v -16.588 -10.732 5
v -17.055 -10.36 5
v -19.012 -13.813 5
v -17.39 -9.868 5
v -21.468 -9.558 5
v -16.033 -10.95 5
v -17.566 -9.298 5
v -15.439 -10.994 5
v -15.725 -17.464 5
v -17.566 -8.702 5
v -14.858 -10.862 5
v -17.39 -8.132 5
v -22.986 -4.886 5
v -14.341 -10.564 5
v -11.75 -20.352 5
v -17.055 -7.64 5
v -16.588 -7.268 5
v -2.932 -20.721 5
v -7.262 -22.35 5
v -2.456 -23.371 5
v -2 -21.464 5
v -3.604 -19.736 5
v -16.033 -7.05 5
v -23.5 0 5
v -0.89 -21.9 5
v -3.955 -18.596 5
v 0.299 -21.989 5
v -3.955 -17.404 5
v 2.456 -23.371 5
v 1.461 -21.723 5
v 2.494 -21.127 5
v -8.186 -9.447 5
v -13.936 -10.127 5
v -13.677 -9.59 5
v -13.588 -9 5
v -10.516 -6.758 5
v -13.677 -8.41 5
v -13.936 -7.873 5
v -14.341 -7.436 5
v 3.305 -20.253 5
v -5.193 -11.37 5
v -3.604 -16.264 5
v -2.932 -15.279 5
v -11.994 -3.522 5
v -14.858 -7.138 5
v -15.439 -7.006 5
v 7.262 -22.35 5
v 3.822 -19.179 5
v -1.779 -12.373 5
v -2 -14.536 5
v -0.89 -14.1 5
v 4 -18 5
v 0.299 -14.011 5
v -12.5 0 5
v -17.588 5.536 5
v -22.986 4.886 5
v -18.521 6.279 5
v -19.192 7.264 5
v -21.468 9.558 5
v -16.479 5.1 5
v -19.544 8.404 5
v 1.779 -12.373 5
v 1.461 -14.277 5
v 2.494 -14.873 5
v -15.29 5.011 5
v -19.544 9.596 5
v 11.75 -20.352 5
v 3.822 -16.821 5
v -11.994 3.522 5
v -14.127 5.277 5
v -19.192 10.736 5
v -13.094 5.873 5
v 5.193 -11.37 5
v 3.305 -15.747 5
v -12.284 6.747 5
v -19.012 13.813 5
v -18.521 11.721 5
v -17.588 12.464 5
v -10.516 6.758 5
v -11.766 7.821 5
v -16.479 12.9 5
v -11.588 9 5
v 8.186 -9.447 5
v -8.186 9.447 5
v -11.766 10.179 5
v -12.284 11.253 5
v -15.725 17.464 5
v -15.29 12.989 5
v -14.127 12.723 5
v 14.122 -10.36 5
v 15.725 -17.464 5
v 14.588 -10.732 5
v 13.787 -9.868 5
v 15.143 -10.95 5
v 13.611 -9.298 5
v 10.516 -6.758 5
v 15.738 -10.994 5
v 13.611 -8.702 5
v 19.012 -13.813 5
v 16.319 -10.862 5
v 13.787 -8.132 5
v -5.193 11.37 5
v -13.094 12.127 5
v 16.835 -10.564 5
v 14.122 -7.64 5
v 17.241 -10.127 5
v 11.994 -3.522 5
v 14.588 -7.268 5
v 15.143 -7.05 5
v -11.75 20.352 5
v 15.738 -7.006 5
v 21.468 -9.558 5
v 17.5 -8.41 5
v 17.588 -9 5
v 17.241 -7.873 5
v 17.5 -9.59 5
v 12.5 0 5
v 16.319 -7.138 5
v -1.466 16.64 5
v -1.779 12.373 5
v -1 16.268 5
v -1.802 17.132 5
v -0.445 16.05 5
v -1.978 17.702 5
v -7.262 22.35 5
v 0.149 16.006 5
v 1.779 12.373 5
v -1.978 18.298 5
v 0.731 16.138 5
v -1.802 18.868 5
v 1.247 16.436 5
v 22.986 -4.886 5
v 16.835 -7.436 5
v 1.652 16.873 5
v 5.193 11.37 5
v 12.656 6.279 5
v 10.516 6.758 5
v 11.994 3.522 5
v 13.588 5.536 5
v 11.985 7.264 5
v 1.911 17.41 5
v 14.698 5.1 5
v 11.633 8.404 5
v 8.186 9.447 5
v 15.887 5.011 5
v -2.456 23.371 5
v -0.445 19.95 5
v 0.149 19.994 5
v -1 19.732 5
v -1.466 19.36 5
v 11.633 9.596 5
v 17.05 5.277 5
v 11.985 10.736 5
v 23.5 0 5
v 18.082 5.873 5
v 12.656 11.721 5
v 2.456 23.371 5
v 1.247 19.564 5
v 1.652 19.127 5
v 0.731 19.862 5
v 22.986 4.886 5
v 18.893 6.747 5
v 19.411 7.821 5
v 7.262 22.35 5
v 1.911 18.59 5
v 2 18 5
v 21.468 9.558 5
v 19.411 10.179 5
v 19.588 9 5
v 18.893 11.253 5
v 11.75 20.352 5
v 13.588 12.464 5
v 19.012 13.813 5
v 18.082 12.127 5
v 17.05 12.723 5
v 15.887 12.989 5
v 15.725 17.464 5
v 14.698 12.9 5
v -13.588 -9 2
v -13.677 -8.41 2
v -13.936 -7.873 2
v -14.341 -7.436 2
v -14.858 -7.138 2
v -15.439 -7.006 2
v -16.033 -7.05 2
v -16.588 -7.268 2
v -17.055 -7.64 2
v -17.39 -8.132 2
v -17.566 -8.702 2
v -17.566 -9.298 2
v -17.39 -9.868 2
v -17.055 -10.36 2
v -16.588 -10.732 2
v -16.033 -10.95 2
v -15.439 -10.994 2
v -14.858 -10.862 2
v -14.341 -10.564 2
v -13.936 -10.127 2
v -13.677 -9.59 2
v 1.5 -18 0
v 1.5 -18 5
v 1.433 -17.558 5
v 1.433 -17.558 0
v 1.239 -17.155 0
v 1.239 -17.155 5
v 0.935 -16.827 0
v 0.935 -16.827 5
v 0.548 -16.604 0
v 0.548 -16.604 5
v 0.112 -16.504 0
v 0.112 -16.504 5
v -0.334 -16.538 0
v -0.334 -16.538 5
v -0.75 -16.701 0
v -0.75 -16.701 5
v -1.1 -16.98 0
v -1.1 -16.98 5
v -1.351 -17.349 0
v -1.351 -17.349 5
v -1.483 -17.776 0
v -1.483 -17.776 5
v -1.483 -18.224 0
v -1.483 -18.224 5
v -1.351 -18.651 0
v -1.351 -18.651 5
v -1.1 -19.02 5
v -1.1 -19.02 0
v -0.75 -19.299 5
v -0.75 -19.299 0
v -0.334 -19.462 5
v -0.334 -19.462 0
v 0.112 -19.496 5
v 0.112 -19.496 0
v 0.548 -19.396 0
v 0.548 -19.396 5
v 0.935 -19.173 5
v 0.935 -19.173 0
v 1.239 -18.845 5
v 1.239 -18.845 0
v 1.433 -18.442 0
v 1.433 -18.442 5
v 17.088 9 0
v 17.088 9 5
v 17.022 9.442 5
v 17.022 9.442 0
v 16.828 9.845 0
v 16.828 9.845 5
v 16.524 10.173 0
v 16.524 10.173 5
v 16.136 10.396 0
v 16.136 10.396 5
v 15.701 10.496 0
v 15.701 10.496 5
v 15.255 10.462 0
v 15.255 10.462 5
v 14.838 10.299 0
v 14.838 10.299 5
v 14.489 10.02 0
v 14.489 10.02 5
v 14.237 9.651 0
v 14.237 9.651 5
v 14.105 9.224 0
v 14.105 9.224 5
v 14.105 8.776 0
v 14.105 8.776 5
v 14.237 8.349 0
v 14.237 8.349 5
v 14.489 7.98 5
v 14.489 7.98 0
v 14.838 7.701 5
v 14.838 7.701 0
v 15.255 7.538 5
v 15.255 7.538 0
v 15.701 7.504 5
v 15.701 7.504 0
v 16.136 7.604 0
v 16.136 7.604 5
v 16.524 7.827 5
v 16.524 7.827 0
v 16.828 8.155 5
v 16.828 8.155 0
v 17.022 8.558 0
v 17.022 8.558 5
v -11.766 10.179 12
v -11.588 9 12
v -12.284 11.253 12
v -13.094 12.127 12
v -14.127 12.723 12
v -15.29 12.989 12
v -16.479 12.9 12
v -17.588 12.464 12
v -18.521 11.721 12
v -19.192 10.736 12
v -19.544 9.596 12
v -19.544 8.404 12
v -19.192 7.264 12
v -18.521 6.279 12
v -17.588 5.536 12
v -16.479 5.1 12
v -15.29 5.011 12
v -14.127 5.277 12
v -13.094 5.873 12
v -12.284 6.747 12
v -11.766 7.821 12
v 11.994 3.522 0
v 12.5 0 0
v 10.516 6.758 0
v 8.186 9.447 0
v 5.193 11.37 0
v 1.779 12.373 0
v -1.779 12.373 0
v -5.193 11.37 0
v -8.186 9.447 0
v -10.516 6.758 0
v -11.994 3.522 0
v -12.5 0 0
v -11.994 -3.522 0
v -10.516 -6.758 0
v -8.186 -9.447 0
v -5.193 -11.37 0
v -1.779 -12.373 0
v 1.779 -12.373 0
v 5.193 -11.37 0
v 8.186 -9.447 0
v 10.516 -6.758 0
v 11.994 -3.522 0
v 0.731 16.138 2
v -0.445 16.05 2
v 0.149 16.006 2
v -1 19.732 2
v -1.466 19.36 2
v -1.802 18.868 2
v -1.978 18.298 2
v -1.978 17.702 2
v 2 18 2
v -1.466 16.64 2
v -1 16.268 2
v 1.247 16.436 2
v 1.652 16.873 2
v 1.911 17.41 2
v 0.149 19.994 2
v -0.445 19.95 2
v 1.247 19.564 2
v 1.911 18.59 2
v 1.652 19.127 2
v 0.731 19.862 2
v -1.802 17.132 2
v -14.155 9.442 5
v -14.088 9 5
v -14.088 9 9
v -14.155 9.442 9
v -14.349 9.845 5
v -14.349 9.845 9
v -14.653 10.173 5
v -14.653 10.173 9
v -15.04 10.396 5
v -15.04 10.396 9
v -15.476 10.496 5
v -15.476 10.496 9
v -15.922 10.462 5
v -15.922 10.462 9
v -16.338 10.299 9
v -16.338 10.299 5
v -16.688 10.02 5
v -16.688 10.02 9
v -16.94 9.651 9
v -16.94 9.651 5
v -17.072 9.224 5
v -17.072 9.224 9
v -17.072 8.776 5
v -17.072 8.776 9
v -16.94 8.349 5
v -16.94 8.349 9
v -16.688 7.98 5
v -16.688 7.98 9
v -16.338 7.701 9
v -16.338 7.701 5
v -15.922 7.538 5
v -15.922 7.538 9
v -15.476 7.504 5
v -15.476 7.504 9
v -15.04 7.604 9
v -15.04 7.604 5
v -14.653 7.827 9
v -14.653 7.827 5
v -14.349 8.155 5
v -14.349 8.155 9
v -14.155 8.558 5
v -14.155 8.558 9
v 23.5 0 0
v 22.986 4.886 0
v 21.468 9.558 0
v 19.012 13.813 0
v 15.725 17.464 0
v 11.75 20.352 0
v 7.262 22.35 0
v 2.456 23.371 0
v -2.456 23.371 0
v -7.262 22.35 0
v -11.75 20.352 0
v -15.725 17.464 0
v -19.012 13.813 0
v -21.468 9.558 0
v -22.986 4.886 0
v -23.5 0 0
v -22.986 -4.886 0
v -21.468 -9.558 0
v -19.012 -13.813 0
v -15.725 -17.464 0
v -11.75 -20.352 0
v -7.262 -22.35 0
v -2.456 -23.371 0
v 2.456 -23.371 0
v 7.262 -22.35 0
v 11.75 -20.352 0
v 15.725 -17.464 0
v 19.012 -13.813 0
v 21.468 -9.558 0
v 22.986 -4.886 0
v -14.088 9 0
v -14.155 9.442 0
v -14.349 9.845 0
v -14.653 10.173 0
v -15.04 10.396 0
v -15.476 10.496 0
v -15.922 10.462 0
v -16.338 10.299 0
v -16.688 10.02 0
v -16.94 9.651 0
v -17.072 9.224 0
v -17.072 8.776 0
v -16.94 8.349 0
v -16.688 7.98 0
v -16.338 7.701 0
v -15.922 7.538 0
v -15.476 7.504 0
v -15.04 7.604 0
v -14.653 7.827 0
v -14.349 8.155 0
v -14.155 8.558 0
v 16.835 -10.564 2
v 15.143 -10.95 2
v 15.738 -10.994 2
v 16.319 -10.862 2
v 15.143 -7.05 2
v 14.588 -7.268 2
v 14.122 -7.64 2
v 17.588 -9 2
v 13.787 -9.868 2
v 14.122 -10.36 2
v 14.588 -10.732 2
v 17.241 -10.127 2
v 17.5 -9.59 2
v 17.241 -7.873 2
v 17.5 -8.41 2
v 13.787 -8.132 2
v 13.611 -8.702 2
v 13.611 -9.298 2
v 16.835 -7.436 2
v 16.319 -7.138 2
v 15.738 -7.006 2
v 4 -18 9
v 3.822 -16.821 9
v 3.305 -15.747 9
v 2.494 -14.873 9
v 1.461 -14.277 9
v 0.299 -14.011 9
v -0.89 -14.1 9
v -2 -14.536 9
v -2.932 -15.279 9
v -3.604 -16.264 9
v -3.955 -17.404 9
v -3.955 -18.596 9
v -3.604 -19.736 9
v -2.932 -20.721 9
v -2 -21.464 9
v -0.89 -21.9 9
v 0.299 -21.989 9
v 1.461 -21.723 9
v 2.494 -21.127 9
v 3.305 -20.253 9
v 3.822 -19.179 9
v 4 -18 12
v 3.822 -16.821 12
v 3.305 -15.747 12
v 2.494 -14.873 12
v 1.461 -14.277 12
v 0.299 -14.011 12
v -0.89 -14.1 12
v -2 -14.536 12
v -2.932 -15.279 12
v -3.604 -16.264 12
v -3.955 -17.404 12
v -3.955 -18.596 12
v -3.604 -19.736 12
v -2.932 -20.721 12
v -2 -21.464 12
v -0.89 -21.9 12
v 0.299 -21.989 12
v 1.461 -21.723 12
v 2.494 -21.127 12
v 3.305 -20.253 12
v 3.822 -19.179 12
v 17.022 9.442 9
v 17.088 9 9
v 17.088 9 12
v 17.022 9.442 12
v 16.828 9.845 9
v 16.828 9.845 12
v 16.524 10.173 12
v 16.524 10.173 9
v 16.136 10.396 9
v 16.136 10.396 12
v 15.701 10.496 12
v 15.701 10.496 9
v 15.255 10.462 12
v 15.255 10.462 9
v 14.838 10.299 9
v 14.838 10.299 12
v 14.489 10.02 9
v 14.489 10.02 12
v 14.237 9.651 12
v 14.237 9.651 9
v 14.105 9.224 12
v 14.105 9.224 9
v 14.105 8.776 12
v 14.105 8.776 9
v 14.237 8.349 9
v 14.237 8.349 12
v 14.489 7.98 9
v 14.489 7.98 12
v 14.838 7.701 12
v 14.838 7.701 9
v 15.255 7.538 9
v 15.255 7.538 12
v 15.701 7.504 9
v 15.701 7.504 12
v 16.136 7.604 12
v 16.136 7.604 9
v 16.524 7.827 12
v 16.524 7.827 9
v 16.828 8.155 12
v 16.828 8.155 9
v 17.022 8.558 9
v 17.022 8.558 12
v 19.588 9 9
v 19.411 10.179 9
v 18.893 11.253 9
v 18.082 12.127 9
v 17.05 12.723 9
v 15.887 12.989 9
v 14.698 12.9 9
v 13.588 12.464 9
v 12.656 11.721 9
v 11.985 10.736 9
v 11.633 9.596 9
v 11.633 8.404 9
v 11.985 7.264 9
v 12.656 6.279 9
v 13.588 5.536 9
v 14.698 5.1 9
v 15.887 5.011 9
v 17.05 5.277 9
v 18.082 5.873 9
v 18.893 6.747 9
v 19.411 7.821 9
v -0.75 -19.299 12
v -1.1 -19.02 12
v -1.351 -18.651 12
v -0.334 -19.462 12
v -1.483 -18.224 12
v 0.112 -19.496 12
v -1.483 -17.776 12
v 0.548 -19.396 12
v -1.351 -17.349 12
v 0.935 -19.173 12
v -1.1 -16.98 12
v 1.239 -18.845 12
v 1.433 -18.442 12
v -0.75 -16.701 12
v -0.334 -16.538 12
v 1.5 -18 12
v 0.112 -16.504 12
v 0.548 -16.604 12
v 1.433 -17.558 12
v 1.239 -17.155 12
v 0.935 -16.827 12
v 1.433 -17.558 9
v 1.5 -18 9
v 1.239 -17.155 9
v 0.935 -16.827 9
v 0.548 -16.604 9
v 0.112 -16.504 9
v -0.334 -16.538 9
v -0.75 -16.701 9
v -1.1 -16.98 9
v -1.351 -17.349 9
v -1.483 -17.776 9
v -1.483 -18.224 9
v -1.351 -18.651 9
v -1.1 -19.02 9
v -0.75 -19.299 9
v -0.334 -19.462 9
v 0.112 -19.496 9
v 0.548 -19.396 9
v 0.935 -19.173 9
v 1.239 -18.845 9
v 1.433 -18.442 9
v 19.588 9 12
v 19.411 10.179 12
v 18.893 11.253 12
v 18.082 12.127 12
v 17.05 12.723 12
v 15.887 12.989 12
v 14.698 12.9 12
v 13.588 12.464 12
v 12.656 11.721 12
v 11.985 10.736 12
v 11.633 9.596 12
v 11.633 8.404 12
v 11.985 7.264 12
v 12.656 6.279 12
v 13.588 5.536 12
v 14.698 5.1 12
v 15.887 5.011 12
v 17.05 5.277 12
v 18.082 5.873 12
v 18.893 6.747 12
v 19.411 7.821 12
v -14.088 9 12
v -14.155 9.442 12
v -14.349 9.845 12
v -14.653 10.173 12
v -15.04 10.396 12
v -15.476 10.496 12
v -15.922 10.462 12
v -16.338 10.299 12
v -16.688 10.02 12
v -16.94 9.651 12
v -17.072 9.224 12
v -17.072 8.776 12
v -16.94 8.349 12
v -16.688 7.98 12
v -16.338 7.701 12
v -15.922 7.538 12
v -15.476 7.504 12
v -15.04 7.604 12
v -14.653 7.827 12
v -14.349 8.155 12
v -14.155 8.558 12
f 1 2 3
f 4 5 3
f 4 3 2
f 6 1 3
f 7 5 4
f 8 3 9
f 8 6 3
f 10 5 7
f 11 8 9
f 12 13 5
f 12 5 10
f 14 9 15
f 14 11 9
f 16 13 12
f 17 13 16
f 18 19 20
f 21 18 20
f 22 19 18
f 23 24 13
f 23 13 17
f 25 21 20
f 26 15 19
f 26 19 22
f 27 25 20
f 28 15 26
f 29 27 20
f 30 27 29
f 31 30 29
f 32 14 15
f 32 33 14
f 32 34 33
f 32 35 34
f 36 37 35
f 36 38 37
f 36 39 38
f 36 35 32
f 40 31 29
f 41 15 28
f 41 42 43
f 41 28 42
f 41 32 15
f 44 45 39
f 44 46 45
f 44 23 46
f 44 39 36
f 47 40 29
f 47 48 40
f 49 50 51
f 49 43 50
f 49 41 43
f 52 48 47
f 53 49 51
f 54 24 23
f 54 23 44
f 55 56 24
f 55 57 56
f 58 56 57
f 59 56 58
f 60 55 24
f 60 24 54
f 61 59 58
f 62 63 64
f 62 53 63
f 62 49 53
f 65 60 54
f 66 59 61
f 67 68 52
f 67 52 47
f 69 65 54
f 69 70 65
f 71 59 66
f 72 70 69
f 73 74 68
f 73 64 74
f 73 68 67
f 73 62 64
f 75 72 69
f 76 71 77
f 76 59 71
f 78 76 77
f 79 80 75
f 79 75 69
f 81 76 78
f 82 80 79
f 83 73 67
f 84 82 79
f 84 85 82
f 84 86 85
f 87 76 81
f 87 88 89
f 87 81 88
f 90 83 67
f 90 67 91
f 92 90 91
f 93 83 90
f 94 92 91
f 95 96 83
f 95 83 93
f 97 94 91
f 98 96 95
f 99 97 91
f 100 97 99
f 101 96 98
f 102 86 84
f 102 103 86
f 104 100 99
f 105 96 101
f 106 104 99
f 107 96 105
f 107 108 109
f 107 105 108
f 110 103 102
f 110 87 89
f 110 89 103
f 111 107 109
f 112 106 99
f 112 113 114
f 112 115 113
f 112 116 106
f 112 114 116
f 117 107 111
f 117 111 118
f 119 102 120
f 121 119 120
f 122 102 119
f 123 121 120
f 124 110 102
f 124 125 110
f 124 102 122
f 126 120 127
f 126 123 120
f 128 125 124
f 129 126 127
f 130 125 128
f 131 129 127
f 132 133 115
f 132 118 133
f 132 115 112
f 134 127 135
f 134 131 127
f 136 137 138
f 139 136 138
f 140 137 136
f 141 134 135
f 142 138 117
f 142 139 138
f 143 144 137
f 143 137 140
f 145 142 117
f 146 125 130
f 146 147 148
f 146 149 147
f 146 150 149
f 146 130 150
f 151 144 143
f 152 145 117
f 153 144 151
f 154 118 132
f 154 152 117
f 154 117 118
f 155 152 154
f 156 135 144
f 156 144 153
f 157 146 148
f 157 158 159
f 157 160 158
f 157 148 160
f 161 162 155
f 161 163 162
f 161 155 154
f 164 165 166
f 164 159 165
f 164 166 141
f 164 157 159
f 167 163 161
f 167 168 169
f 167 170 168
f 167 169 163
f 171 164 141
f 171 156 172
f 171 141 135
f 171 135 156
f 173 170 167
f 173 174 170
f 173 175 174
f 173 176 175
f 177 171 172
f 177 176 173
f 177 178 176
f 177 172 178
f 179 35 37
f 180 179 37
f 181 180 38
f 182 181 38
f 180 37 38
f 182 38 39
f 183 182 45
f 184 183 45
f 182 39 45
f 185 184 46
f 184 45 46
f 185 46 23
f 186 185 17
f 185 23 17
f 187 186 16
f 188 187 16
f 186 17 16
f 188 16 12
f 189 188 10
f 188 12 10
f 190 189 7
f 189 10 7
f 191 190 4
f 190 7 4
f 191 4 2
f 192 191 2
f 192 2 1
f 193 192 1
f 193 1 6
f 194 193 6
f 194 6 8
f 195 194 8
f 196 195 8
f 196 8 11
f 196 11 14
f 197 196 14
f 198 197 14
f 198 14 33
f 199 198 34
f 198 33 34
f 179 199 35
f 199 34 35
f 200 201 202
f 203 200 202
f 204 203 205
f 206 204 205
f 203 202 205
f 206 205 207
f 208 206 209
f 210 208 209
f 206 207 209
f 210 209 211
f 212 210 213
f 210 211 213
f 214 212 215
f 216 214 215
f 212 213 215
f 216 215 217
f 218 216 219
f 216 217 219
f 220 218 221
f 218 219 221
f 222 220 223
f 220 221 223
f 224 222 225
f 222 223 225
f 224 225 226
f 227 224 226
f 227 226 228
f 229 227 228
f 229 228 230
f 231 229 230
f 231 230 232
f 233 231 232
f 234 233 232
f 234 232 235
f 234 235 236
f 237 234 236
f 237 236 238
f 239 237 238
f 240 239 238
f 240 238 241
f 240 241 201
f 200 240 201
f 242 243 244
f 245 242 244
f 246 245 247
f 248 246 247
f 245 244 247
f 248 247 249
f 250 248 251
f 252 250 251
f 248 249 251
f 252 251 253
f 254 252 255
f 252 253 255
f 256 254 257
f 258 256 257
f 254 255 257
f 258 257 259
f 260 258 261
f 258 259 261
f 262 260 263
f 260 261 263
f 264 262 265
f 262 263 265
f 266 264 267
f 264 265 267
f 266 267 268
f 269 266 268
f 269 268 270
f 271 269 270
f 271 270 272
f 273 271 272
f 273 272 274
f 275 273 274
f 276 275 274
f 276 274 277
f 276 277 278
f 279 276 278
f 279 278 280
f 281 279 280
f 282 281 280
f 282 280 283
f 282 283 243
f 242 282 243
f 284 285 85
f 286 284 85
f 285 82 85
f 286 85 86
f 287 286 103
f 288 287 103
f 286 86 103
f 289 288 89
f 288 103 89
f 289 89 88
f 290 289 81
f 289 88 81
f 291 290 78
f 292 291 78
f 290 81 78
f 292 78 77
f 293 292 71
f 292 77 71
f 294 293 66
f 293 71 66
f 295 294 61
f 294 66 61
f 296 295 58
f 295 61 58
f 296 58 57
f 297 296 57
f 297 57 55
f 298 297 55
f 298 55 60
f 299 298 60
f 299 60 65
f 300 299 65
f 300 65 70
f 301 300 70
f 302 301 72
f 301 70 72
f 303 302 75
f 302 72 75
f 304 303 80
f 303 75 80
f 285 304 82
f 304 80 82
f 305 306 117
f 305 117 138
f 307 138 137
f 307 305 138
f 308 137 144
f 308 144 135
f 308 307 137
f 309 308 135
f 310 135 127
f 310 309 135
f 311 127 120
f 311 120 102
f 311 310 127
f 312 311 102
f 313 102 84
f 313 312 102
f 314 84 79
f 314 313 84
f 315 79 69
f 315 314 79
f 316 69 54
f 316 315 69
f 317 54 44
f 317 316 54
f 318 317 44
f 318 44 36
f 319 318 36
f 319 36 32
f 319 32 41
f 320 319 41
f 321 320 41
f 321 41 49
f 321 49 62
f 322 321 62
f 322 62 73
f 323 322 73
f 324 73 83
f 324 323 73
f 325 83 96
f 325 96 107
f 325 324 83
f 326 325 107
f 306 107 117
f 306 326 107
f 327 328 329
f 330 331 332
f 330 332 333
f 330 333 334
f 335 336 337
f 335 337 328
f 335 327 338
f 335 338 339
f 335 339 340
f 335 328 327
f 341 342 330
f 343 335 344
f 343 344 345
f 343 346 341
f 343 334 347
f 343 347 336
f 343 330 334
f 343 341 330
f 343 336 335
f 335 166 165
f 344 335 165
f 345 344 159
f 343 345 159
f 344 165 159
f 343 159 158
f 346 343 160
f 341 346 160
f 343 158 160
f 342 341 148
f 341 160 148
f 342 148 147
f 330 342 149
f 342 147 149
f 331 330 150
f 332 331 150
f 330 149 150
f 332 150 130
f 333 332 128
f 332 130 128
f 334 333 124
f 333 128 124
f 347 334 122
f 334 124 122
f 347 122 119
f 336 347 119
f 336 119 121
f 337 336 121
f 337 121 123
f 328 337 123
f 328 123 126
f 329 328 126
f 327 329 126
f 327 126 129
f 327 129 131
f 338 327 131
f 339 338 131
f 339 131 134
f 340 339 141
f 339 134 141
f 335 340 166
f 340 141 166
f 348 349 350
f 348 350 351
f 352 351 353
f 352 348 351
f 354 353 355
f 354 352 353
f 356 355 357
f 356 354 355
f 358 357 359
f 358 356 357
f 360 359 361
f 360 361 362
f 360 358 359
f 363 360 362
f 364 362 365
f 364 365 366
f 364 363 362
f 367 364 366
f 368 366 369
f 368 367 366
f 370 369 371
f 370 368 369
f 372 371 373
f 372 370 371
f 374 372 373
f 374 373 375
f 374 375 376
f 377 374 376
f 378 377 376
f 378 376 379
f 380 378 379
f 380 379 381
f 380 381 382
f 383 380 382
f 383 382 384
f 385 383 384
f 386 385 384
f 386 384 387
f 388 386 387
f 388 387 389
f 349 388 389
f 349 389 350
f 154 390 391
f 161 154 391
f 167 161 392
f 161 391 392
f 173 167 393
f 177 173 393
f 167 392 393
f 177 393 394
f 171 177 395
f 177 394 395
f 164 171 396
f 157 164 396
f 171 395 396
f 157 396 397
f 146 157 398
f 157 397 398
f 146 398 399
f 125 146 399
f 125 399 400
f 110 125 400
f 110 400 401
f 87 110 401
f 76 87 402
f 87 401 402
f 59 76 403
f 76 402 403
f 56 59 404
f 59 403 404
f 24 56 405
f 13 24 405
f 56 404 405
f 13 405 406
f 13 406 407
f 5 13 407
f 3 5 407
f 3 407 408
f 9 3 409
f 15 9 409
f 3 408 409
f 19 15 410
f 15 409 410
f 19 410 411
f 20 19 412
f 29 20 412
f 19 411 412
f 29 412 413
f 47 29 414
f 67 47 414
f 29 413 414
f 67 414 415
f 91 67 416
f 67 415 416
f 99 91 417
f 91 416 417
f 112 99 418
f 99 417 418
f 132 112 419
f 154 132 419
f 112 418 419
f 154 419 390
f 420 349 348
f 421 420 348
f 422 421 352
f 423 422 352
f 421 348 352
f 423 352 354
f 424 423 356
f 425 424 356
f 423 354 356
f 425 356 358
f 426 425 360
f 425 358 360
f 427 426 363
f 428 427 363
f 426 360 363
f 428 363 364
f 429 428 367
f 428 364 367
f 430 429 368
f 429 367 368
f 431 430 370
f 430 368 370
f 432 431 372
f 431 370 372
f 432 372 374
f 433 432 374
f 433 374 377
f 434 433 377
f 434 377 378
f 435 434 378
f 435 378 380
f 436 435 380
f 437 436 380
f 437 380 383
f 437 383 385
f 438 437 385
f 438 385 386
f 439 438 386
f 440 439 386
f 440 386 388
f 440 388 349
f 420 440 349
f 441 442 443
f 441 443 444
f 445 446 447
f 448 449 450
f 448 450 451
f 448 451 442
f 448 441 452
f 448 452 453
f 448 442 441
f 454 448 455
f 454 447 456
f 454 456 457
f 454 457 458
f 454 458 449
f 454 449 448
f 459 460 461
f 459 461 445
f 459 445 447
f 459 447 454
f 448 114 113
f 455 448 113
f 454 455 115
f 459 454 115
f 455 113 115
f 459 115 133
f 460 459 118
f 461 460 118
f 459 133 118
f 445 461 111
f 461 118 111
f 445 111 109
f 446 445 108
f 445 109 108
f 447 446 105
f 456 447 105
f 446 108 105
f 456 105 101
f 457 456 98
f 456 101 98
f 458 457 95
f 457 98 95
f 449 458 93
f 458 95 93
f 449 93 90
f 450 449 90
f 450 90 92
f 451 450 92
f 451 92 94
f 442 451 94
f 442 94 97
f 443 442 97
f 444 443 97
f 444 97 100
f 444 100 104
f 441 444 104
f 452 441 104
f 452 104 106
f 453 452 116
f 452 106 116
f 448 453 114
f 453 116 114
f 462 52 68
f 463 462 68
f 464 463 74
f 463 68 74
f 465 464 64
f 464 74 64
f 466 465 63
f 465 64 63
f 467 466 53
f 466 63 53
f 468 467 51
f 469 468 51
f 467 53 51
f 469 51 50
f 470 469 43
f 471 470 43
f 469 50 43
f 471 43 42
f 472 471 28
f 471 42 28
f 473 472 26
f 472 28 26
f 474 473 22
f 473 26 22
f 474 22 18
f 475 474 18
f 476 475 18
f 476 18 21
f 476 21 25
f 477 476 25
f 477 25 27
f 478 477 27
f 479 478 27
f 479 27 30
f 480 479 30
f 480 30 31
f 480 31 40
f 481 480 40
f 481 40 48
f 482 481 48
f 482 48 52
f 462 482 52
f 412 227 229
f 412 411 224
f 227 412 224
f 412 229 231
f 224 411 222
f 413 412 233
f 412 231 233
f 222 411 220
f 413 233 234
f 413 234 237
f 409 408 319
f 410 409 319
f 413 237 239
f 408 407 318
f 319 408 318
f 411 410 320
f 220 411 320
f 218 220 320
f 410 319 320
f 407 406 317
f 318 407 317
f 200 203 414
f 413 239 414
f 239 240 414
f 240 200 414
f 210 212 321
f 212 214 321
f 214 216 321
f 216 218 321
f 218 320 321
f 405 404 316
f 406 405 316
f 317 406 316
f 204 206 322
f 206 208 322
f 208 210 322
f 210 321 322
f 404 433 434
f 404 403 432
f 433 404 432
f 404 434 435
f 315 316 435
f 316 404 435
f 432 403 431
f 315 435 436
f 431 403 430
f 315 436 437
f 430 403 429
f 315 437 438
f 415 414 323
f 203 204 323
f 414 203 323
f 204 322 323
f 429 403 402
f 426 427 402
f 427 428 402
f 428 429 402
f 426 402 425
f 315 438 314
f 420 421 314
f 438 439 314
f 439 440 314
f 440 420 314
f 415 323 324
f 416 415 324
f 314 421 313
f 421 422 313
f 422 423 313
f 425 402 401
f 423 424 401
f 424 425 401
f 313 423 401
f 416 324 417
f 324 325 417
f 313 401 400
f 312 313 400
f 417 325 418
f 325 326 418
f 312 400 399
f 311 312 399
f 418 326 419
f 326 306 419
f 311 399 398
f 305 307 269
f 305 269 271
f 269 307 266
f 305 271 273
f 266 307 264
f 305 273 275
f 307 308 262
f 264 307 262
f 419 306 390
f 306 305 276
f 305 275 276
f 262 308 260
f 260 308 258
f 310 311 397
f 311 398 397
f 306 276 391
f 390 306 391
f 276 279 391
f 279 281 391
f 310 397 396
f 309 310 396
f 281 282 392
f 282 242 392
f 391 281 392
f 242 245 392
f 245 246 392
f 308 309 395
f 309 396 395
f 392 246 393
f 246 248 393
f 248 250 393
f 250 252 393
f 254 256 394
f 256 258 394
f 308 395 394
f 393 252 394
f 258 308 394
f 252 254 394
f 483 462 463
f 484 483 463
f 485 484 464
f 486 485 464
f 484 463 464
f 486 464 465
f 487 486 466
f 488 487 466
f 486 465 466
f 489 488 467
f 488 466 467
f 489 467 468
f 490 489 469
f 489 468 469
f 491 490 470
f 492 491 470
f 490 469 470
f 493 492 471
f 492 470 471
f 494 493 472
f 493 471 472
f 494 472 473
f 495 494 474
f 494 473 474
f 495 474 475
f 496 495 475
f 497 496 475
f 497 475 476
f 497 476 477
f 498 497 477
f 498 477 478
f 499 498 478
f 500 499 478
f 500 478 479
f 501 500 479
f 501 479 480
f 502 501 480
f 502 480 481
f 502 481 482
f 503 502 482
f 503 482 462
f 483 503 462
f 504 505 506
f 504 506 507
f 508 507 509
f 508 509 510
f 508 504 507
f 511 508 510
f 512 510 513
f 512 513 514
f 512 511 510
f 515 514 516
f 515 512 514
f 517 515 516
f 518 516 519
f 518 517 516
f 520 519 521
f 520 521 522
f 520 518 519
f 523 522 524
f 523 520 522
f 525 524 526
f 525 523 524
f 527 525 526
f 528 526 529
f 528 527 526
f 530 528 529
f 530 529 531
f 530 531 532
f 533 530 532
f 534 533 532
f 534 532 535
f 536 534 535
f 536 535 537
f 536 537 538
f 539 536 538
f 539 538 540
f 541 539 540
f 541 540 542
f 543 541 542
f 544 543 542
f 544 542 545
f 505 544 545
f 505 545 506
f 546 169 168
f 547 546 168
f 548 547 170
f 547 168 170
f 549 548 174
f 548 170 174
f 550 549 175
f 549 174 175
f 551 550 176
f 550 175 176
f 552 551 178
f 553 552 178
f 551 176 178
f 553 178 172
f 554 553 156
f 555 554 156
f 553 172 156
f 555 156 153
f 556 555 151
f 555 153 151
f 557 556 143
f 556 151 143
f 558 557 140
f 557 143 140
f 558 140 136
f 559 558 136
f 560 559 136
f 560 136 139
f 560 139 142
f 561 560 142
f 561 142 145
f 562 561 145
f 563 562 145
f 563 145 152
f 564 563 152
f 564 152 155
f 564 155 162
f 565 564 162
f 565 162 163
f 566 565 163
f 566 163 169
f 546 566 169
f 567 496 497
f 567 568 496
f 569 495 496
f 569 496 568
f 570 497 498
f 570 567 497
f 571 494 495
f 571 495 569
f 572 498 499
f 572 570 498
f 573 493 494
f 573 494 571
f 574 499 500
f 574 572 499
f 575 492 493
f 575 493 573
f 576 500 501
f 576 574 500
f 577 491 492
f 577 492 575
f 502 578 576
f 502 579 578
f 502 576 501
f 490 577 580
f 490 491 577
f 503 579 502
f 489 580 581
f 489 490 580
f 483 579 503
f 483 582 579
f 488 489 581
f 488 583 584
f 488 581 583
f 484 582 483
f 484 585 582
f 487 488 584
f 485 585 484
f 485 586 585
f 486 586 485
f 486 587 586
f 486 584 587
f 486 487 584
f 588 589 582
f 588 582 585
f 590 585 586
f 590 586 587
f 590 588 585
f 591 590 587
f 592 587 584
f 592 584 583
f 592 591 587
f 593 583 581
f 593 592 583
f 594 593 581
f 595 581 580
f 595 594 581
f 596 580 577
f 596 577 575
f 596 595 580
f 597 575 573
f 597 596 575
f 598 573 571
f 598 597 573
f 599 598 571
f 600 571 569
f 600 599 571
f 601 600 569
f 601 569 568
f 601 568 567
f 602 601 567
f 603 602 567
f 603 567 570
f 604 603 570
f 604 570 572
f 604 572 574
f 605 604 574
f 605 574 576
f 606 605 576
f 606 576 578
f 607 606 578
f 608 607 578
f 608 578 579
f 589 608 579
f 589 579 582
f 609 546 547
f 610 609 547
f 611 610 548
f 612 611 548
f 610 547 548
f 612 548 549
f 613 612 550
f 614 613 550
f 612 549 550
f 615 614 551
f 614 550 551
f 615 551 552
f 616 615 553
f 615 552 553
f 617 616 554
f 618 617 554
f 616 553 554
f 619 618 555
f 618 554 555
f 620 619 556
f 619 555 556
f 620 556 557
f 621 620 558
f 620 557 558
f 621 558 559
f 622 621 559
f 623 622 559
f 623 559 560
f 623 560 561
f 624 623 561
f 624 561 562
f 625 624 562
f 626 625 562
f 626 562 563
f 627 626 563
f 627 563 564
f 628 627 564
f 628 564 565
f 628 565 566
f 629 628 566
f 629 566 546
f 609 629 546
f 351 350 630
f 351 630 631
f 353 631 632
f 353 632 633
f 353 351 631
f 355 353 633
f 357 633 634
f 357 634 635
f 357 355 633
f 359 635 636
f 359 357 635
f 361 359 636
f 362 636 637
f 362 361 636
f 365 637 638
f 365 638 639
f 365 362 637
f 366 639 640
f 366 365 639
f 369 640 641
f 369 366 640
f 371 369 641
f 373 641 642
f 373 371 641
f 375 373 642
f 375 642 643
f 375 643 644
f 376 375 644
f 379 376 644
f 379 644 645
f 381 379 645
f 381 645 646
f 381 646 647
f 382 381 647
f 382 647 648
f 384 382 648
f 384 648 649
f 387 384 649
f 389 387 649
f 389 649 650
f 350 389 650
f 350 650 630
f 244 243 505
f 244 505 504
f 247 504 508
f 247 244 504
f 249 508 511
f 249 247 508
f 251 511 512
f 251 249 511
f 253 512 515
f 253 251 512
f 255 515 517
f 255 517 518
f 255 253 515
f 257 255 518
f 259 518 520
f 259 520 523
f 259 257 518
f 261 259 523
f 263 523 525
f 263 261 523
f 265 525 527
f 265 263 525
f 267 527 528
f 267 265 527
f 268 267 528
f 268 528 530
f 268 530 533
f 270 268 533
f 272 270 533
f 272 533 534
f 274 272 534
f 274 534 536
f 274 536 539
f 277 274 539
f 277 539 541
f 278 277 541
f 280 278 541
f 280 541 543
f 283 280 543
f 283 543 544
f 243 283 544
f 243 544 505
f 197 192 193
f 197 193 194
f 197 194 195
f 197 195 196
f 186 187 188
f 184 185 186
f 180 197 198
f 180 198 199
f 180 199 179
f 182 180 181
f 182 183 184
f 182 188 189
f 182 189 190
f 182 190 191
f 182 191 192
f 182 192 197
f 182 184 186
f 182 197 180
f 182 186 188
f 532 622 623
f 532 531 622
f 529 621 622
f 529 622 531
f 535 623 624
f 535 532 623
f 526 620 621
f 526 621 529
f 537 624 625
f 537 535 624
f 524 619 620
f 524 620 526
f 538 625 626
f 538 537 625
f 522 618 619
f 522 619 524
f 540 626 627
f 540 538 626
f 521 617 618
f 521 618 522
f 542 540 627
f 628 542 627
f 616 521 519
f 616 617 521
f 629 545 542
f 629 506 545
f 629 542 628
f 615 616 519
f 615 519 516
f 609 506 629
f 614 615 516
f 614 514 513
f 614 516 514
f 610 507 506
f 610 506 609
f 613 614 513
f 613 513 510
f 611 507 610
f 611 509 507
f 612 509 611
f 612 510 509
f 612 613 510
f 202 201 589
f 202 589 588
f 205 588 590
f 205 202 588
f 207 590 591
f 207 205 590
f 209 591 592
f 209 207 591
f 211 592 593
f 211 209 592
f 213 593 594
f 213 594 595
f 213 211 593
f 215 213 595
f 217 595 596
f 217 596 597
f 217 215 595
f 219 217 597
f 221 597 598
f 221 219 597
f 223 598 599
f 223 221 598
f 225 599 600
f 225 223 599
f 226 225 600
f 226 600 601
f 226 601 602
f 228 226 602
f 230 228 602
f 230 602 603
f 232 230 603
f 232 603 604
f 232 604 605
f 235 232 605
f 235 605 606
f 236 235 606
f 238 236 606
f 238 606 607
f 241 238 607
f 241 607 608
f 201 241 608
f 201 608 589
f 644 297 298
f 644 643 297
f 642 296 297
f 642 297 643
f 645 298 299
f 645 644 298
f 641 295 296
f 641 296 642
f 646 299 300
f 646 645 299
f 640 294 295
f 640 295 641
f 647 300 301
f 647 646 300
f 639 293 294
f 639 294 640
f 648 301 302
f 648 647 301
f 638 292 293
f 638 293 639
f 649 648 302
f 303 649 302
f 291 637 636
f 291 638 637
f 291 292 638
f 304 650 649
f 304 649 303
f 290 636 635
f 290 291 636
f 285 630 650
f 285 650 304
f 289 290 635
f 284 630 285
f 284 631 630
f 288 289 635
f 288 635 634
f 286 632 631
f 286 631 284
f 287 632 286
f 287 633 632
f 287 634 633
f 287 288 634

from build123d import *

# Parameters (mm, degrees)
SKETCH1_R               = 23.5
SKETCH1_R_2             = 12.5
BOSS_EXTRUDE1_DEPTH     = 5
SKETCH2_R               = 2
CUT_EXTRUDE1_DEPTH      = 3
SKETCH3_R               = 1.5
CUT_EXTRUDE2_DEPTH      = 90
CUT_EXTRUDE2_DEPTH_BACK = 54
SKETCH6_R               = 4
SKETCH6_R_2             = 1.5
BOSS_EXTRUDE3_DEPTH     = 7
SKETCH7_R               = 4
SKETCH7_R_2             = 1.5
BOSS_EXTRUDE4_DEPTH     = 3


with BuildPart() as part:
    # Sketch1 → Boss-Extrude1 (new body)
    with BuildSketch(Plane.XY):
        Circle(SKETCH1_R)
        Circle(SKETCH1_R_2, mode=Mode.SUBTRACT)
    extrude(amount=BOSS_EXTRUDE1_DEPTH)

    # Sketch2 → Cut-Extrude1 (cut)
    with BuildSketch(Plane.XY.offset(5)):
        with Locations((0, 18)):
            Circle(SKETCH2_R)
        with Locations((15.588457268, -9)):
            Circle(SKETCH2_R)
        with Locations((-15.588457268, -9)):
            Circle(SKETCH2_R)
    extrude(amount=-CUT_EXTRUDE1_DEPTH, mode=Mode.SUBTRACT)

    # Sketch3 → Cut-Extrude2 (cut, two sides)
    with BuildSketch(Plane.XY.offset(5)) as cut_extrude2_sk:
        with Locations((-15.588457268, 9)):
            Circle(SKETCH3_R)
        with Locations((15.588457268, 9)):
            Circle(SKETCH3_R)
        with Locations((0, -18)):
            Circle(SKETCH3_R)
    extrude(amount=CUT_EXTRUDE2_DEPTH, mode=Mode.SUBTRACT)
    extrude(cut_extrude2_sk.sketch, amount=-CUT_EXTRUDE2_DEPTH_BACK, mode=Mode.SUBTRACT)

    # Sketch6 → Boss-Extrude3 (add)
    with BuildSketch(Plane.XY.offset(5)):
        with Locations((-15.588457268, 9)):
            Circle(SKETCH6_R)
        with Locations((-15.588457268, 9)):
            Circle(SKETCH6_R_2, mode=Mode.SUBTRACT)
        with Locations((15.588457268, 9)):
            Circle(SKETCH6_R)
        with Locations((15.588457268, 9)):
            Circle(SKETCH6_R_2, mode=Mode.SUBTRACT)
        with Locations((0, -18)):
            Circle(SKETCH6_R)
        with Locations((0, -18)):
            Circle(SKETCH6_R_2, mode=Mode.SUBTRACT)
    extrude(amount=BOSS_EXTRUDE3_DEPTH)

    # Sketch7 → Boss-Extrude4 (add)
    with BuildSketch(Plane.XY.offset(12)):
        with Locations((-15.588457268, 9)):
            Circle(SKETCH7_R)
        with Locations((-15.588457268, 9)):
            Circle(SKETCH7_R_2, mode=Mode.SUBTRACT)
        with Locations((15.588457268, 9)):
            Circle(SKETCH7_R)
        with Locations((15.588457268, 9)):
            Circle(SKETCH7_R_2, mode=Mode.SUBTRACT)
        with Locations((0, -18)):
            Circle(SKETCH7_R)
        with Locations((0, -18)):
            Circle(SKETCH7_R_2, mode=Mode.SUBTRACT)
    extrude(amount=-BOSS_EXTRUDE4_DEPTH)


solid = part.part
